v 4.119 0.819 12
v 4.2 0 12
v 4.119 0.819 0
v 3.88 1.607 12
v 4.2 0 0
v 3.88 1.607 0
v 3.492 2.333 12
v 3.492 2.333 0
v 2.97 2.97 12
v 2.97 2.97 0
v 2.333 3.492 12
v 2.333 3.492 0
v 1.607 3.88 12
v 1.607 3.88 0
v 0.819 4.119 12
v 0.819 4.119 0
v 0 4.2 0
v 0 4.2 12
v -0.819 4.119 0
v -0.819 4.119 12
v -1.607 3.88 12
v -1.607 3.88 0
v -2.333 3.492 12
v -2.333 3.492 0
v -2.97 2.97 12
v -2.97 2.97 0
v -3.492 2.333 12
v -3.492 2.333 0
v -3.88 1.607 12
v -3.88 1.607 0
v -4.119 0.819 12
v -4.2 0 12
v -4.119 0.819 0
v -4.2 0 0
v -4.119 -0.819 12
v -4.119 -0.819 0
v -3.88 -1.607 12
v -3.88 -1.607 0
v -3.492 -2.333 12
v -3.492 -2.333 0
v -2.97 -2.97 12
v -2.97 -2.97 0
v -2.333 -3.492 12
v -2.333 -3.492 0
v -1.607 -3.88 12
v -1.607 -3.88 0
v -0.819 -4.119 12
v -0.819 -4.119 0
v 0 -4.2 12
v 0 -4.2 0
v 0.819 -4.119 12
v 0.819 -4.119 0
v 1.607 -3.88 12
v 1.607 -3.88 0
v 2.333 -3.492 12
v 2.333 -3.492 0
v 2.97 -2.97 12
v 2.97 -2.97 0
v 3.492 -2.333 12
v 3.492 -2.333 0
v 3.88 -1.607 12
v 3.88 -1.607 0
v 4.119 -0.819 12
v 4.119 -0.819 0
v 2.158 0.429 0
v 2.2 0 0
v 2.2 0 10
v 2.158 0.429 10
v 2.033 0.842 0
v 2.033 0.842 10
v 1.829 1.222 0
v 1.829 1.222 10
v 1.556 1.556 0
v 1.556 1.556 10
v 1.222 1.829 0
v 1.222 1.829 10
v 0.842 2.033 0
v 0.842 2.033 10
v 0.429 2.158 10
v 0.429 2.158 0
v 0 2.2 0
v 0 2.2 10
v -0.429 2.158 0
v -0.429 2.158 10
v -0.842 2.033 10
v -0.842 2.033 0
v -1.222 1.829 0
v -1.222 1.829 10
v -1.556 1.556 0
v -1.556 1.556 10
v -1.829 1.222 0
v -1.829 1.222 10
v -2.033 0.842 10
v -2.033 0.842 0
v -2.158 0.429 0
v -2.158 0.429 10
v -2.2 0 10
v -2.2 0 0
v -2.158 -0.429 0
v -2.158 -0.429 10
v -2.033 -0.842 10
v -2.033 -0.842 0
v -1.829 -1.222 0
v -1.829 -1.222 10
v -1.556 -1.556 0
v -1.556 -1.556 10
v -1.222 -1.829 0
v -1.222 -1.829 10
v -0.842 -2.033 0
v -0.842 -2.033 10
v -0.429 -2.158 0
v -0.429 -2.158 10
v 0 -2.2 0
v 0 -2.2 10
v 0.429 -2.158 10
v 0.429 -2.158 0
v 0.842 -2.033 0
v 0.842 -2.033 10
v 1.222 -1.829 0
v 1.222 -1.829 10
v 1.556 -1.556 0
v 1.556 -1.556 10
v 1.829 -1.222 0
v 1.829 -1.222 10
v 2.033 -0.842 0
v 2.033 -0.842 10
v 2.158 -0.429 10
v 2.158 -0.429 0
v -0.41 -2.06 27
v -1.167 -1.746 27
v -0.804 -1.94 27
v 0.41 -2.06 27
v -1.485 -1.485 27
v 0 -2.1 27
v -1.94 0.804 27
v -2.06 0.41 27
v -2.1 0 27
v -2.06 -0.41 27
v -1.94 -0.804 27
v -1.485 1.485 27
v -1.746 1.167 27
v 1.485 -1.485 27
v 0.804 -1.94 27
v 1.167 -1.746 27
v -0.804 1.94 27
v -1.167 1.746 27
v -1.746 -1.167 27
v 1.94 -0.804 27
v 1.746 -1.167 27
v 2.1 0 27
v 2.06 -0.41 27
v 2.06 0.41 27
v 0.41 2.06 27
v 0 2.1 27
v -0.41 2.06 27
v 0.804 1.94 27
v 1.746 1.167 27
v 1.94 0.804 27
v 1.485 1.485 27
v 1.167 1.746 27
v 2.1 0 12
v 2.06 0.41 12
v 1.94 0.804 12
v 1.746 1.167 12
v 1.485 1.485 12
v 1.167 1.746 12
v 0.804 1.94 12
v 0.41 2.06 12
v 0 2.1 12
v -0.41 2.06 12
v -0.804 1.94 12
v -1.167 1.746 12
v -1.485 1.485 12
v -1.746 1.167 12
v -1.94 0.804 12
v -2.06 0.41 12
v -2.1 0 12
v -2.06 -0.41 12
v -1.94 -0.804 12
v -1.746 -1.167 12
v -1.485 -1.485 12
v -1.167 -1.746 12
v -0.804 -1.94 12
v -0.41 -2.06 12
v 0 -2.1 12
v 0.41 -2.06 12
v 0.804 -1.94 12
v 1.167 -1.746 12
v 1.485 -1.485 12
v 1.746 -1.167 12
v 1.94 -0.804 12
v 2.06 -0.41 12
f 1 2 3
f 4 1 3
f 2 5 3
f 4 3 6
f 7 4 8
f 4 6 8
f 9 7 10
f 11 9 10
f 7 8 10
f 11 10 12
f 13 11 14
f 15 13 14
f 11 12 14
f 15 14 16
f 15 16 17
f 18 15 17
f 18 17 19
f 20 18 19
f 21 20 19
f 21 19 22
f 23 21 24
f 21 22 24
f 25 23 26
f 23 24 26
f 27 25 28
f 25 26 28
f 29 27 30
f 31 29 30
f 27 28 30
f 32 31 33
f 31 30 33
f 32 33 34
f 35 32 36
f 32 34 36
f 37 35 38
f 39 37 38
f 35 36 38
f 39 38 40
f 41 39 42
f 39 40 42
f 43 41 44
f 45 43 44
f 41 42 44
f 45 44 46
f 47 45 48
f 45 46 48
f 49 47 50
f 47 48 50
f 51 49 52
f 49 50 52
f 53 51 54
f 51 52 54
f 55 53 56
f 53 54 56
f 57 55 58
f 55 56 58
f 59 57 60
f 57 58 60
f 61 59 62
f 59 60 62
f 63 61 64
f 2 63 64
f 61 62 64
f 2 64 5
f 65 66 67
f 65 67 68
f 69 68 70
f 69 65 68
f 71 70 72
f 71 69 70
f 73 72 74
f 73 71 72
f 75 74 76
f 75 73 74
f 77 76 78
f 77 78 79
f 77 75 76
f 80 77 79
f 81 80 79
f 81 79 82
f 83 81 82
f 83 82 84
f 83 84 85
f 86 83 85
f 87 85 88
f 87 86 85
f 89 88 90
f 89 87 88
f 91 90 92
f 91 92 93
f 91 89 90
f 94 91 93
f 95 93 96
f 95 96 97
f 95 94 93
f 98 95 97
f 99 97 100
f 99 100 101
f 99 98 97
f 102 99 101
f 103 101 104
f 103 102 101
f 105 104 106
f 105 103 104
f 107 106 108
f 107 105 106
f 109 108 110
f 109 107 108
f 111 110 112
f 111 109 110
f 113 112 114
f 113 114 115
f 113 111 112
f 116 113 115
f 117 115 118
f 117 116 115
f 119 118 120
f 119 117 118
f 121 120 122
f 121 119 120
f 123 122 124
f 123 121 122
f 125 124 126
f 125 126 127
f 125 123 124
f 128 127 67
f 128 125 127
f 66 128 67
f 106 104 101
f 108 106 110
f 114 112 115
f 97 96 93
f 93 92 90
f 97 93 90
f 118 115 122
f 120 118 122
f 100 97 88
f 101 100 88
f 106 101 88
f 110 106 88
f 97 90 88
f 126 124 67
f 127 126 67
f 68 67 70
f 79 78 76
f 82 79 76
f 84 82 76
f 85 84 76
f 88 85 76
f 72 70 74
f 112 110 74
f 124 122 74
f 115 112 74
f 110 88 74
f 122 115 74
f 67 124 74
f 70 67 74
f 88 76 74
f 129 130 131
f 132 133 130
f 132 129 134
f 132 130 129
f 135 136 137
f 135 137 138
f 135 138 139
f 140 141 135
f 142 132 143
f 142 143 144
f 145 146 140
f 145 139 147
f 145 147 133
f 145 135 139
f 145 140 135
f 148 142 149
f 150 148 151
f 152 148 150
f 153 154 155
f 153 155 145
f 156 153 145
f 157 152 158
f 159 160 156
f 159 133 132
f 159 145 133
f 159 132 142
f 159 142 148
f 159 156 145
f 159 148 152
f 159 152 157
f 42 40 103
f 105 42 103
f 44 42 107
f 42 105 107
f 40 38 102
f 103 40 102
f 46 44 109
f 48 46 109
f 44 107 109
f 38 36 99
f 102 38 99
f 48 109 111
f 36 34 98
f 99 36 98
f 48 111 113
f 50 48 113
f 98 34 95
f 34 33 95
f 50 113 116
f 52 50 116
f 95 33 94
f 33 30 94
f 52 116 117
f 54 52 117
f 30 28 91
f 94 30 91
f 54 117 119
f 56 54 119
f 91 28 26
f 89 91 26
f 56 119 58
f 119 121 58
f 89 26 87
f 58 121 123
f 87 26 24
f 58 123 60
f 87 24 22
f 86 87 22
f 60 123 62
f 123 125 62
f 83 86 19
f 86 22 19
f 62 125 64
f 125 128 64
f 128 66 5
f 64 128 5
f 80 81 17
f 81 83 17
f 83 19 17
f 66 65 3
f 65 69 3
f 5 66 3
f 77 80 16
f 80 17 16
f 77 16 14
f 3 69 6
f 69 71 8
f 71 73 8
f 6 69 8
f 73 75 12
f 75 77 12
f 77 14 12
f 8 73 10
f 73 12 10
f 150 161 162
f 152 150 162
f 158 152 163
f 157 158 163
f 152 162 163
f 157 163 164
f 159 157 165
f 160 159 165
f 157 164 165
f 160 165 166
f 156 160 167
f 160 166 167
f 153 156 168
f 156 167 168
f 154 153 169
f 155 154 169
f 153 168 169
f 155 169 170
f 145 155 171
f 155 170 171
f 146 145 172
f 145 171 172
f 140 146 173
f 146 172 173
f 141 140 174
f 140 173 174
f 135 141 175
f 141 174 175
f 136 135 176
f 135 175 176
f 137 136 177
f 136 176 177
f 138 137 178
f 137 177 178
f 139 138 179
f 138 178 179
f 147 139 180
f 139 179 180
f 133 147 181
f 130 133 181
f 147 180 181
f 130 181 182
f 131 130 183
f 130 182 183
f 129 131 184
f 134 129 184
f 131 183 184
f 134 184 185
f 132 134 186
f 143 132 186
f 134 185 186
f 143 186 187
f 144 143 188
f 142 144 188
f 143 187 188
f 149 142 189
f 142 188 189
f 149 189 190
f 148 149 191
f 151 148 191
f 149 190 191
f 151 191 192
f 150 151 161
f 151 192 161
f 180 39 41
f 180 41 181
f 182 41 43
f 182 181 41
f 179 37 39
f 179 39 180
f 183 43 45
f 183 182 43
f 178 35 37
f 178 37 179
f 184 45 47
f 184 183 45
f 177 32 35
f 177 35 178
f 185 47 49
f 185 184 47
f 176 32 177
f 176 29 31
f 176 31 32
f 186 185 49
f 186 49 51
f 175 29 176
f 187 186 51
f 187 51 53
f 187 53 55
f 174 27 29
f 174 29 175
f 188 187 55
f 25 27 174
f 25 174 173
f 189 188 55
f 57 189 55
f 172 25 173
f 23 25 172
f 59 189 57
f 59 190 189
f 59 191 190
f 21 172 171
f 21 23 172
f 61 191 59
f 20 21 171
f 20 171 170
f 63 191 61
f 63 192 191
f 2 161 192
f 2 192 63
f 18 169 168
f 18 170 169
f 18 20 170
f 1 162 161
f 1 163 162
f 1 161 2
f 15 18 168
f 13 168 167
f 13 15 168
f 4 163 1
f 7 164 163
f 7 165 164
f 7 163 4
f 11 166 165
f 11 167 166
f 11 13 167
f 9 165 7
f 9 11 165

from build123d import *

# Parameters (mm, degrees)
SKETCH1_R           = 4.2
SKETCH1_R_2         = 2.2
BOSS_EXTRUDE1_DEPTH = 10
SKETCH2_R           = 4.2
BOSS_EXTRUDE2_DEPTH = 2
SKETCH3_R           = 2.1
BOSS_EXTRUDE3_DEPTH = 15


with BuildPart() as part:
    # Sketch1 → Boss-Extrude1 (new body)
    with BuildSketch(Plane.XY):
        Circle(SKETCH1_R)
        Circle(SKETCH1_R_2, mode=Mode.SUBTRACT)
    extrude(amount=BOSS_EXTRUDE1_DEPTH)

    # Sketch2 → Boss-Extrude2 (add)
    with BuildSketch(Plane.XY.offset(10)):
        Circle(SKETCH2_R)
    extrude(amount=BOSS_EXTRUDE2_DEPTH)

    # Sketch3 → Boss-Extrude3 (add)
    with BuildSketch(Plane.XY.offset(12)):
        Circle(SKETCH3_R)
    extrude(amount=BOSS_EXTRUDE3_DEPTH)


solid = part.part
